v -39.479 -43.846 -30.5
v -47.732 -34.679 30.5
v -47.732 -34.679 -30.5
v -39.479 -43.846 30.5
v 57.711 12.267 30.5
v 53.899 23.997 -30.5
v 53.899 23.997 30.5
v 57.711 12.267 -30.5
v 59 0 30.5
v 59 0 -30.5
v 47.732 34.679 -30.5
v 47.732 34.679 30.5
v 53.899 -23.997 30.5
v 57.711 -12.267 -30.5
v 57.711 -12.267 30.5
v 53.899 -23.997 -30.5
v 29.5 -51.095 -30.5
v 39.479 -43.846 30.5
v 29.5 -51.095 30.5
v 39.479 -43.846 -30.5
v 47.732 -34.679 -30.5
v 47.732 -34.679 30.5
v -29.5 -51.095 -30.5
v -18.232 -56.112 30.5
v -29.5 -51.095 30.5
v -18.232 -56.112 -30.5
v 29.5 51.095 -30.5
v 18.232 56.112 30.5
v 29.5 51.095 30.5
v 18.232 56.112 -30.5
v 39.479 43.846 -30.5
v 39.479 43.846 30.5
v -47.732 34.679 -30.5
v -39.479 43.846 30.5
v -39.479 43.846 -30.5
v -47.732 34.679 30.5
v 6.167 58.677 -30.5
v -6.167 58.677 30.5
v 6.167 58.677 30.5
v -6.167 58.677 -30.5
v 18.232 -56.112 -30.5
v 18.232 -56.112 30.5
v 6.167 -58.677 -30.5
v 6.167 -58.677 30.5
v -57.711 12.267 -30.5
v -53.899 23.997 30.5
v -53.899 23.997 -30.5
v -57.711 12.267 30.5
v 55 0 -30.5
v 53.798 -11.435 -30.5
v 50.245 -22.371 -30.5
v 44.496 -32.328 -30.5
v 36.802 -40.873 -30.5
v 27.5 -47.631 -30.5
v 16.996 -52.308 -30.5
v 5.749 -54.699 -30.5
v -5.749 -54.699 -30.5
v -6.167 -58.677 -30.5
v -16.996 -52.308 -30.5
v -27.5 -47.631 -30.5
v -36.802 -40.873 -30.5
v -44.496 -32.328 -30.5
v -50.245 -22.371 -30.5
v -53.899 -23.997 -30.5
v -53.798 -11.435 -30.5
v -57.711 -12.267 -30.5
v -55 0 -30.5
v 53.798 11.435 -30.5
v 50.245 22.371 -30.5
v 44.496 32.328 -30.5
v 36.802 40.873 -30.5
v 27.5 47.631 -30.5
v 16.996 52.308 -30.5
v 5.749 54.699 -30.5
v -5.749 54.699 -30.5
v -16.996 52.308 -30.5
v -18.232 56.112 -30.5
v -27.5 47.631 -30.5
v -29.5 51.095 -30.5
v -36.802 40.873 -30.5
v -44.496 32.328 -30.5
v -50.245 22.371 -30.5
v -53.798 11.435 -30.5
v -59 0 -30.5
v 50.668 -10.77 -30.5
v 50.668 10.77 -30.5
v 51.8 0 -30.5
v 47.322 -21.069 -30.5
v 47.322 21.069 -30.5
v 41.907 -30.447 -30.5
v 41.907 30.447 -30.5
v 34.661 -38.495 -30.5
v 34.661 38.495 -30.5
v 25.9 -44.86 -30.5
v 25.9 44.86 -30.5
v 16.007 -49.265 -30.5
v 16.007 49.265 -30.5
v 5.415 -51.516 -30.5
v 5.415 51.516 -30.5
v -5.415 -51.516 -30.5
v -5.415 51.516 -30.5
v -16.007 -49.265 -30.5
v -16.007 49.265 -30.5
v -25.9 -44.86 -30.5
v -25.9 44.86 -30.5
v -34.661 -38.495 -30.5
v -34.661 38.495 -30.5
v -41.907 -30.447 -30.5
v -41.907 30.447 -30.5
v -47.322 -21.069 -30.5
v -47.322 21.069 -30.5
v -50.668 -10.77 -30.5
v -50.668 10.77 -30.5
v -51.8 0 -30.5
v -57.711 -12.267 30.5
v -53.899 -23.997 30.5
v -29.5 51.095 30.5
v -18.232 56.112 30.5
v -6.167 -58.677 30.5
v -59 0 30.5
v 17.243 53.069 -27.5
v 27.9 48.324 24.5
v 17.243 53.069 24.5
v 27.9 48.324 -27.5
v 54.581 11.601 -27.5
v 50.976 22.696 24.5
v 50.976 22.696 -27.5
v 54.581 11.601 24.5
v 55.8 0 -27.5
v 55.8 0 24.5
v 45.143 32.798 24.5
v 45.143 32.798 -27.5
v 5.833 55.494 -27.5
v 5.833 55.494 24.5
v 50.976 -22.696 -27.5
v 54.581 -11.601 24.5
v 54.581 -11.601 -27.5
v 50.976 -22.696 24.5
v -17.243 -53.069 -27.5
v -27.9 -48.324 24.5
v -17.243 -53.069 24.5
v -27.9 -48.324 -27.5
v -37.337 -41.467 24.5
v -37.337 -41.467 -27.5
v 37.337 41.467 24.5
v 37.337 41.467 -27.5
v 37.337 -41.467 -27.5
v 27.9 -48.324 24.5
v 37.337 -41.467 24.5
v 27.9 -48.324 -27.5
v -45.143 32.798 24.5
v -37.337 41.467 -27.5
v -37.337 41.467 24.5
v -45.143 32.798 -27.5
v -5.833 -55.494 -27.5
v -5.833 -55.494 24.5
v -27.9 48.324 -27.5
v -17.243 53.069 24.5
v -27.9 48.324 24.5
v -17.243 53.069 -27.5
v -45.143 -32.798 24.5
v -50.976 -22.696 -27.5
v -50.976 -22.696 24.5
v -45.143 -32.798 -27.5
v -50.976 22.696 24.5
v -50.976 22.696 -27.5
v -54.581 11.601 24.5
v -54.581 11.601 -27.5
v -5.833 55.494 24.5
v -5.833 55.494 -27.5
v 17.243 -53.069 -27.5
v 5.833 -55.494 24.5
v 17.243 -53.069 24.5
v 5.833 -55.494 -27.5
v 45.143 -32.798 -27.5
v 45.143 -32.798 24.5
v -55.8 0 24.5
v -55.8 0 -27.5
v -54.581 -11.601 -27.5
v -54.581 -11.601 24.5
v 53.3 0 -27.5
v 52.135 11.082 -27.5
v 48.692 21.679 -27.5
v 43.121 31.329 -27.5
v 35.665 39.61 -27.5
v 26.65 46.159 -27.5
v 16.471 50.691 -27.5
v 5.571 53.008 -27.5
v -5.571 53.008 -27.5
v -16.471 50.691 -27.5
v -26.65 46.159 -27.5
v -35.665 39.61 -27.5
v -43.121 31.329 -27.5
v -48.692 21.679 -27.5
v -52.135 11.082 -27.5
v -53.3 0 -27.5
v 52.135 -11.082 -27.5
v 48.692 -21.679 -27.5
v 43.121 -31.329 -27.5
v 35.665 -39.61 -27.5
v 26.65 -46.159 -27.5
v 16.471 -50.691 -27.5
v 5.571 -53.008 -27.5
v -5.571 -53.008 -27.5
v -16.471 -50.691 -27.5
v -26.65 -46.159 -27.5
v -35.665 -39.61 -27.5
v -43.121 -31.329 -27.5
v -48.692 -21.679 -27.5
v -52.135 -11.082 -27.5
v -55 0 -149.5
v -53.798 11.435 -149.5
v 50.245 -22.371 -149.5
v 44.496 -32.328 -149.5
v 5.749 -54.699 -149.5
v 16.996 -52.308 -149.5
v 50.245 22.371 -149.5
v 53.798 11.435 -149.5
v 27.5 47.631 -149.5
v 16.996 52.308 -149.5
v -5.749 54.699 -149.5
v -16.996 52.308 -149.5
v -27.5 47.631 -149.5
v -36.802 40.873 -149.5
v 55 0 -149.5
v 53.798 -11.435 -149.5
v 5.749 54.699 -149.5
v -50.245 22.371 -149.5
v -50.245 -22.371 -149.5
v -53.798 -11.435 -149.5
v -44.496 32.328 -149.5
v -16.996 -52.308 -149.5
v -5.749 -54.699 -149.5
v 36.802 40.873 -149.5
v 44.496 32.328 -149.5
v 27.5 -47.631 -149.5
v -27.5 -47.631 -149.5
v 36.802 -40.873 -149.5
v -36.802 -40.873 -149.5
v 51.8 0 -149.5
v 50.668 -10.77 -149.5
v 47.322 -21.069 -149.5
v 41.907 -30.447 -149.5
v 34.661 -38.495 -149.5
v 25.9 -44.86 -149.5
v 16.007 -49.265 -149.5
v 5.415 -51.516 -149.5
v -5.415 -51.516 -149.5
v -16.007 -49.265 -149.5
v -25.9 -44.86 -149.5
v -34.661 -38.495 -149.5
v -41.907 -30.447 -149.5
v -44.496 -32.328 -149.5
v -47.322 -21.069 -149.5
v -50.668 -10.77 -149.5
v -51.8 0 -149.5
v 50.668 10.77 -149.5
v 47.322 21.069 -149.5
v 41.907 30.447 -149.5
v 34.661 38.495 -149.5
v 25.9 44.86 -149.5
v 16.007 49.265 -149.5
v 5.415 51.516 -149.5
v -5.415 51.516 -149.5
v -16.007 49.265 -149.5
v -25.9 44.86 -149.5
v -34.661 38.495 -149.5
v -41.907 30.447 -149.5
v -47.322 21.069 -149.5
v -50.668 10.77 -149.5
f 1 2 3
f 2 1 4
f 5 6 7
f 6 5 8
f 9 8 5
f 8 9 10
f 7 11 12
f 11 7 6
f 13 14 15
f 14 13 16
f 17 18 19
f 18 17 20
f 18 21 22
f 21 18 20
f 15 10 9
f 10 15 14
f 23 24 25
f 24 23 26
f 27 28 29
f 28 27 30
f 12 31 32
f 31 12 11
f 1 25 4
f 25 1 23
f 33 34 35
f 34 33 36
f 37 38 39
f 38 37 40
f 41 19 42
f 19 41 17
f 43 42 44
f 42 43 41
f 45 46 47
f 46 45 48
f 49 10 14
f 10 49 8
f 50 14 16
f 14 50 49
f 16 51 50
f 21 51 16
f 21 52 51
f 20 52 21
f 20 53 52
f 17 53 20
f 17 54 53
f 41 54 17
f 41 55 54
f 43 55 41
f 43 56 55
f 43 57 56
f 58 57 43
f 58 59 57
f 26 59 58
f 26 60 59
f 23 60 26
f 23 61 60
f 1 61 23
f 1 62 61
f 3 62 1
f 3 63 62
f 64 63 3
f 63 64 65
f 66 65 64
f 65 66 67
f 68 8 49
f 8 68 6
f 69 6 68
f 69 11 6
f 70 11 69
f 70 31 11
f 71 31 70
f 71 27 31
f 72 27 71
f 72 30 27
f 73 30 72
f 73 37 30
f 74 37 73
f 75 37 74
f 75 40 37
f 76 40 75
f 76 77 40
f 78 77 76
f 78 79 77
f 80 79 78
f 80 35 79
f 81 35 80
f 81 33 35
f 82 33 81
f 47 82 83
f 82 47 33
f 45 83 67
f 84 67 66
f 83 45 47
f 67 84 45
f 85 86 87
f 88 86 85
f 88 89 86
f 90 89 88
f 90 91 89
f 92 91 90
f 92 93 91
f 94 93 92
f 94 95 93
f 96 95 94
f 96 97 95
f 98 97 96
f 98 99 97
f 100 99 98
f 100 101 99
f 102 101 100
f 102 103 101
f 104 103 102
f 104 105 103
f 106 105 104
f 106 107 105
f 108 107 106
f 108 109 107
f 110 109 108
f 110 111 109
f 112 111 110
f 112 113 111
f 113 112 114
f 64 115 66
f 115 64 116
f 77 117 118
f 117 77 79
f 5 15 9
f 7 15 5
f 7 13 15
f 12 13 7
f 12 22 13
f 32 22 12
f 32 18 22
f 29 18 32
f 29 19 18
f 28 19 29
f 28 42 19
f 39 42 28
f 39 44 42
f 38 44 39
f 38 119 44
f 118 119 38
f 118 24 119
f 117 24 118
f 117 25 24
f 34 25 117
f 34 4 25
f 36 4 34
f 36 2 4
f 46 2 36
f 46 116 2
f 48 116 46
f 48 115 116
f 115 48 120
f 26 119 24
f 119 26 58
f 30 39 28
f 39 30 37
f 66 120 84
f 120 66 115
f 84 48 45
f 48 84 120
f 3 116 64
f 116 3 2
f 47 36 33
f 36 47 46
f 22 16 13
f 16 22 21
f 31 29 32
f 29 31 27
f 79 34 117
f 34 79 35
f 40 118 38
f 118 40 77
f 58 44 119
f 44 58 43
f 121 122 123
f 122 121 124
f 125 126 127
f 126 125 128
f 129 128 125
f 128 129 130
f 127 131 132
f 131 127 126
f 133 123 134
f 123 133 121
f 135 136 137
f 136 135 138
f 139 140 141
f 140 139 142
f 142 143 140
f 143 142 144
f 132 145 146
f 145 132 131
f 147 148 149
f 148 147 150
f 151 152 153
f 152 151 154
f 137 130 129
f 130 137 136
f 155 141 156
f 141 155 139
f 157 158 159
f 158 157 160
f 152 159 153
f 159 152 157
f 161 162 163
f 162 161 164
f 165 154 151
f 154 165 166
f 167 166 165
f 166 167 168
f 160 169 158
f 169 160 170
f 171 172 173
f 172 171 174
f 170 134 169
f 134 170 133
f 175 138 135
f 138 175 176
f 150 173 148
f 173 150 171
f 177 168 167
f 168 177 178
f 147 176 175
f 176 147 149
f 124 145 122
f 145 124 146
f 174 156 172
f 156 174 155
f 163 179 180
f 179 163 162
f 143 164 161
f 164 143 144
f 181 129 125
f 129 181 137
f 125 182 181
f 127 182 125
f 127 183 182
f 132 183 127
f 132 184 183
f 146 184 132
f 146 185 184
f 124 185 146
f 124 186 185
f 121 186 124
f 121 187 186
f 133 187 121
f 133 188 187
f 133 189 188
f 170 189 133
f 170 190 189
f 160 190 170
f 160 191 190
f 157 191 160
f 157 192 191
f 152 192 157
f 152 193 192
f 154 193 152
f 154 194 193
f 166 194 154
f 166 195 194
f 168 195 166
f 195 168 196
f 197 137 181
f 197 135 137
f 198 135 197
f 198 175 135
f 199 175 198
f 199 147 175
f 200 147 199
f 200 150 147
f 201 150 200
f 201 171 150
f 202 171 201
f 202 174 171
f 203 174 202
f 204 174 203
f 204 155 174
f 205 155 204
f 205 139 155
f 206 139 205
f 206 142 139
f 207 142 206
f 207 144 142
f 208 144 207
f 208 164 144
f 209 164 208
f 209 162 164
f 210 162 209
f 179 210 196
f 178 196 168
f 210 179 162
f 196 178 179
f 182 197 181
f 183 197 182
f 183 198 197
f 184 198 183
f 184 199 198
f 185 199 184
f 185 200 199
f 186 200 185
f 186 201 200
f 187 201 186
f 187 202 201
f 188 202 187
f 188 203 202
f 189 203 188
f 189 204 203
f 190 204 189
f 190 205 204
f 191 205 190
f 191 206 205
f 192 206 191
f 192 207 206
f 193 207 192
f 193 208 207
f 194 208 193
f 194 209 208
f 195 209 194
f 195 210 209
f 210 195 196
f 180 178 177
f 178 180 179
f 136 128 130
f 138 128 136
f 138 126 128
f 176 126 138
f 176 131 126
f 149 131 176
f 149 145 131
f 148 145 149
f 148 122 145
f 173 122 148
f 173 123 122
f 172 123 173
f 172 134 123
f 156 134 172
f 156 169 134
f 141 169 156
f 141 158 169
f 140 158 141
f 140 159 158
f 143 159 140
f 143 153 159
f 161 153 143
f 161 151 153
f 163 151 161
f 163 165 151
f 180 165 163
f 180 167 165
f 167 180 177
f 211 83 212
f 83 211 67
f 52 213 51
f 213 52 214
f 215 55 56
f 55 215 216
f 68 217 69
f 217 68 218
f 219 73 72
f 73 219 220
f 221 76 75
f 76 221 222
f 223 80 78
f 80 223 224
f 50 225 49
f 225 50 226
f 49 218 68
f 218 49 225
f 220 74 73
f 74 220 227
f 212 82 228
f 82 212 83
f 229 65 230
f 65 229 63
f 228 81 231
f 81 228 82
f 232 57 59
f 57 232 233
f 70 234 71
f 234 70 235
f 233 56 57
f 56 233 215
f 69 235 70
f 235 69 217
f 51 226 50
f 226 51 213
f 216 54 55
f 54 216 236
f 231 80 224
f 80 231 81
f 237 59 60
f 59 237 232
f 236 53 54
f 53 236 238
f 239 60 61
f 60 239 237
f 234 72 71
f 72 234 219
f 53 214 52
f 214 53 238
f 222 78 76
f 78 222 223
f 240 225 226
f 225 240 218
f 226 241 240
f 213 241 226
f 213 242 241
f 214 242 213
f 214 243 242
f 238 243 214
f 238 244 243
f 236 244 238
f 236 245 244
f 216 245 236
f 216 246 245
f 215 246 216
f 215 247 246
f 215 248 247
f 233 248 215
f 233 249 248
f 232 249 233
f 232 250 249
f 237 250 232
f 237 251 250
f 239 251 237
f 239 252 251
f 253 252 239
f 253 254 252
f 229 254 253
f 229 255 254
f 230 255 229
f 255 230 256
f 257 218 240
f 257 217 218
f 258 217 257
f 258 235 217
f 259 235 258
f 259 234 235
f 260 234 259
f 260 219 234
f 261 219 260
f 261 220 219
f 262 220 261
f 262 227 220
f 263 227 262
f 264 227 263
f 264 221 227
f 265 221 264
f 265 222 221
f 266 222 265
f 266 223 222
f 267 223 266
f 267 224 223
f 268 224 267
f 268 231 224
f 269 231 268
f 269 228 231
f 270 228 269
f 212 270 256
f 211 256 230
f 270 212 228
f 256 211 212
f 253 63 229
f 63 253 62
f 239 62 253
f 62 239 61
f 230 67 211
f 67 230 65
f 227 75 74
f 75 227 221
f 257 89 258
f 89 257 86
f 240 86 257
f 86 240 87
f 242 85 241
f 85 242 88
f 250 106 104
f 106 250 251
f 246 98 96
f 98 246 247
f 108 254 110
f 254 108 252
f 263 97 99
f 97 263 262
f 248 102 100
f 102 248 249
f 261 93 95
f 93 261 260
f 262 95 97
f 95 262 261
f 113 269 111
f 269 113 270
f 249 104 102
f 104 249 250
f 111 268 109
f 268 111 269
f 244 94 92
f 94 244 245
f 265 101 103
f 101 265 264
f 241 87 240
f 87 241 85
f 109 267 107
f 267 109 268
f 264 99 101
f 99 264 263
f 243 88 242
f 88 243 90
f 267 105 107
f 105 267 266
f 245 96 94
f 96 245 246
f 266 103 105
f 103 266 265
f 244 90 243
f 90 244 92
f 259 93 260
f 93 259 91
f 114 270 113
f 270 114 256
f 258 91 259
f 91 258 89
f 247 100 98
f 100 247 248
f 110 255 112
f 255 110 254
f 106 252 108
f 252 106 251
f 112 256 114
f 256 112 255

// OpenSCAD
// Parameters
nominal_diameter_mm = 110; //[55:220:1]
wall_thickness = 3.2; //[1.6:6.4:0.1]
socket_depth = 55; //[30:110:1]
cap_end_thickness = 6; //[3:12:0.5]
socket_clearance = 0.8; //[0.2:2:0.1]
outer_diameter_extra = 8; //[4:16:0.5]
stop_lip_thickness = 3; //[1.5:6:0.5]
stop_lip_radial = 2.5; //[1:6:0.5]
pipe_length = 120; //[60:240:1]
overlap = 1; //[0.5:2:0.1]

// HT Pipe - complete geometry
module ht_pipe() {
  color([0.85, 0.85, 0.8]) {
    difference() {
      // Outer pipe
      cylinder(r=nominal_diameter_mm/2, h=pipe_length, center=true);
      // Inner void
      translate([0, 0, -overlap])
        cylinder(r=nominal_diameter_mm/2 - wall_thickness, h=pipe_length + overlap*2, center=true);
    }
  }
}

// End Cap with Socket
module end_cap_with_socket() {
  color([0.85, 0.85, 0.8]) {
    union() {
      // End cap body shell
      difference() {
        cylinder(r=(nominal_diameter_mm + outer_diameter_extra)/2, h=socket_depth + cap_end_thickness, center=true);
        translate([0, 0, cap_end_thickness/2])
          cylinder(r=(nominal_diameter_mm/2 + socket_clearance), h=socket_depth + cap_end_thickness, center=true);
      }
      // Cap end face solid
      translate([0, 0, socket_depth/2])
        cylinder(r=(nominal_diameter_mm + outer_diameter_extra)/2, h=cap_end_thickness, center=true);
      // Pipe interface socket shell
      difference() {
        translate([0, 0, -cap_end_thickness/2])
          cylinder(r=(nominal_diameter_mm + outer_diameter_extra)/2, h=socket_depth, center=true);
        translate([0, 0, -cap_end_thickness/2])
          cylinder(r=(nominal_diameter_mm/2 + socket_clearance), h=socket_depth + overlap*2, center=true);
      }
      // Internal stop lip
      difference() {
        translate([0, 0, -cap_end_thickness/2 - socket_depth/2 + stop_lip_thickness/2])
          cylinder(r=(nominal_diameter_mm/2 + socket_clearance), h=stop_lip_thickness, center=true);
        translate([0, 0, -cap_end_thickness/2 - socket_depth/2 + stop_lip_thickness/2])
          cylinder(r=(nominal_diameter_mm/2 + socket_clearance - stop_lip_radial), h=stop_lip_thickness + overlap*2, center=true);
      }
    }
  }
}

// Assembly
module assembly() {
  end_cap_with_socket();
  translate([0, 0, -cap_end_thickness/2 - socket_depth/2 - pipe_length/2 + overlap])
    ht_pipe();
}

assembly();
